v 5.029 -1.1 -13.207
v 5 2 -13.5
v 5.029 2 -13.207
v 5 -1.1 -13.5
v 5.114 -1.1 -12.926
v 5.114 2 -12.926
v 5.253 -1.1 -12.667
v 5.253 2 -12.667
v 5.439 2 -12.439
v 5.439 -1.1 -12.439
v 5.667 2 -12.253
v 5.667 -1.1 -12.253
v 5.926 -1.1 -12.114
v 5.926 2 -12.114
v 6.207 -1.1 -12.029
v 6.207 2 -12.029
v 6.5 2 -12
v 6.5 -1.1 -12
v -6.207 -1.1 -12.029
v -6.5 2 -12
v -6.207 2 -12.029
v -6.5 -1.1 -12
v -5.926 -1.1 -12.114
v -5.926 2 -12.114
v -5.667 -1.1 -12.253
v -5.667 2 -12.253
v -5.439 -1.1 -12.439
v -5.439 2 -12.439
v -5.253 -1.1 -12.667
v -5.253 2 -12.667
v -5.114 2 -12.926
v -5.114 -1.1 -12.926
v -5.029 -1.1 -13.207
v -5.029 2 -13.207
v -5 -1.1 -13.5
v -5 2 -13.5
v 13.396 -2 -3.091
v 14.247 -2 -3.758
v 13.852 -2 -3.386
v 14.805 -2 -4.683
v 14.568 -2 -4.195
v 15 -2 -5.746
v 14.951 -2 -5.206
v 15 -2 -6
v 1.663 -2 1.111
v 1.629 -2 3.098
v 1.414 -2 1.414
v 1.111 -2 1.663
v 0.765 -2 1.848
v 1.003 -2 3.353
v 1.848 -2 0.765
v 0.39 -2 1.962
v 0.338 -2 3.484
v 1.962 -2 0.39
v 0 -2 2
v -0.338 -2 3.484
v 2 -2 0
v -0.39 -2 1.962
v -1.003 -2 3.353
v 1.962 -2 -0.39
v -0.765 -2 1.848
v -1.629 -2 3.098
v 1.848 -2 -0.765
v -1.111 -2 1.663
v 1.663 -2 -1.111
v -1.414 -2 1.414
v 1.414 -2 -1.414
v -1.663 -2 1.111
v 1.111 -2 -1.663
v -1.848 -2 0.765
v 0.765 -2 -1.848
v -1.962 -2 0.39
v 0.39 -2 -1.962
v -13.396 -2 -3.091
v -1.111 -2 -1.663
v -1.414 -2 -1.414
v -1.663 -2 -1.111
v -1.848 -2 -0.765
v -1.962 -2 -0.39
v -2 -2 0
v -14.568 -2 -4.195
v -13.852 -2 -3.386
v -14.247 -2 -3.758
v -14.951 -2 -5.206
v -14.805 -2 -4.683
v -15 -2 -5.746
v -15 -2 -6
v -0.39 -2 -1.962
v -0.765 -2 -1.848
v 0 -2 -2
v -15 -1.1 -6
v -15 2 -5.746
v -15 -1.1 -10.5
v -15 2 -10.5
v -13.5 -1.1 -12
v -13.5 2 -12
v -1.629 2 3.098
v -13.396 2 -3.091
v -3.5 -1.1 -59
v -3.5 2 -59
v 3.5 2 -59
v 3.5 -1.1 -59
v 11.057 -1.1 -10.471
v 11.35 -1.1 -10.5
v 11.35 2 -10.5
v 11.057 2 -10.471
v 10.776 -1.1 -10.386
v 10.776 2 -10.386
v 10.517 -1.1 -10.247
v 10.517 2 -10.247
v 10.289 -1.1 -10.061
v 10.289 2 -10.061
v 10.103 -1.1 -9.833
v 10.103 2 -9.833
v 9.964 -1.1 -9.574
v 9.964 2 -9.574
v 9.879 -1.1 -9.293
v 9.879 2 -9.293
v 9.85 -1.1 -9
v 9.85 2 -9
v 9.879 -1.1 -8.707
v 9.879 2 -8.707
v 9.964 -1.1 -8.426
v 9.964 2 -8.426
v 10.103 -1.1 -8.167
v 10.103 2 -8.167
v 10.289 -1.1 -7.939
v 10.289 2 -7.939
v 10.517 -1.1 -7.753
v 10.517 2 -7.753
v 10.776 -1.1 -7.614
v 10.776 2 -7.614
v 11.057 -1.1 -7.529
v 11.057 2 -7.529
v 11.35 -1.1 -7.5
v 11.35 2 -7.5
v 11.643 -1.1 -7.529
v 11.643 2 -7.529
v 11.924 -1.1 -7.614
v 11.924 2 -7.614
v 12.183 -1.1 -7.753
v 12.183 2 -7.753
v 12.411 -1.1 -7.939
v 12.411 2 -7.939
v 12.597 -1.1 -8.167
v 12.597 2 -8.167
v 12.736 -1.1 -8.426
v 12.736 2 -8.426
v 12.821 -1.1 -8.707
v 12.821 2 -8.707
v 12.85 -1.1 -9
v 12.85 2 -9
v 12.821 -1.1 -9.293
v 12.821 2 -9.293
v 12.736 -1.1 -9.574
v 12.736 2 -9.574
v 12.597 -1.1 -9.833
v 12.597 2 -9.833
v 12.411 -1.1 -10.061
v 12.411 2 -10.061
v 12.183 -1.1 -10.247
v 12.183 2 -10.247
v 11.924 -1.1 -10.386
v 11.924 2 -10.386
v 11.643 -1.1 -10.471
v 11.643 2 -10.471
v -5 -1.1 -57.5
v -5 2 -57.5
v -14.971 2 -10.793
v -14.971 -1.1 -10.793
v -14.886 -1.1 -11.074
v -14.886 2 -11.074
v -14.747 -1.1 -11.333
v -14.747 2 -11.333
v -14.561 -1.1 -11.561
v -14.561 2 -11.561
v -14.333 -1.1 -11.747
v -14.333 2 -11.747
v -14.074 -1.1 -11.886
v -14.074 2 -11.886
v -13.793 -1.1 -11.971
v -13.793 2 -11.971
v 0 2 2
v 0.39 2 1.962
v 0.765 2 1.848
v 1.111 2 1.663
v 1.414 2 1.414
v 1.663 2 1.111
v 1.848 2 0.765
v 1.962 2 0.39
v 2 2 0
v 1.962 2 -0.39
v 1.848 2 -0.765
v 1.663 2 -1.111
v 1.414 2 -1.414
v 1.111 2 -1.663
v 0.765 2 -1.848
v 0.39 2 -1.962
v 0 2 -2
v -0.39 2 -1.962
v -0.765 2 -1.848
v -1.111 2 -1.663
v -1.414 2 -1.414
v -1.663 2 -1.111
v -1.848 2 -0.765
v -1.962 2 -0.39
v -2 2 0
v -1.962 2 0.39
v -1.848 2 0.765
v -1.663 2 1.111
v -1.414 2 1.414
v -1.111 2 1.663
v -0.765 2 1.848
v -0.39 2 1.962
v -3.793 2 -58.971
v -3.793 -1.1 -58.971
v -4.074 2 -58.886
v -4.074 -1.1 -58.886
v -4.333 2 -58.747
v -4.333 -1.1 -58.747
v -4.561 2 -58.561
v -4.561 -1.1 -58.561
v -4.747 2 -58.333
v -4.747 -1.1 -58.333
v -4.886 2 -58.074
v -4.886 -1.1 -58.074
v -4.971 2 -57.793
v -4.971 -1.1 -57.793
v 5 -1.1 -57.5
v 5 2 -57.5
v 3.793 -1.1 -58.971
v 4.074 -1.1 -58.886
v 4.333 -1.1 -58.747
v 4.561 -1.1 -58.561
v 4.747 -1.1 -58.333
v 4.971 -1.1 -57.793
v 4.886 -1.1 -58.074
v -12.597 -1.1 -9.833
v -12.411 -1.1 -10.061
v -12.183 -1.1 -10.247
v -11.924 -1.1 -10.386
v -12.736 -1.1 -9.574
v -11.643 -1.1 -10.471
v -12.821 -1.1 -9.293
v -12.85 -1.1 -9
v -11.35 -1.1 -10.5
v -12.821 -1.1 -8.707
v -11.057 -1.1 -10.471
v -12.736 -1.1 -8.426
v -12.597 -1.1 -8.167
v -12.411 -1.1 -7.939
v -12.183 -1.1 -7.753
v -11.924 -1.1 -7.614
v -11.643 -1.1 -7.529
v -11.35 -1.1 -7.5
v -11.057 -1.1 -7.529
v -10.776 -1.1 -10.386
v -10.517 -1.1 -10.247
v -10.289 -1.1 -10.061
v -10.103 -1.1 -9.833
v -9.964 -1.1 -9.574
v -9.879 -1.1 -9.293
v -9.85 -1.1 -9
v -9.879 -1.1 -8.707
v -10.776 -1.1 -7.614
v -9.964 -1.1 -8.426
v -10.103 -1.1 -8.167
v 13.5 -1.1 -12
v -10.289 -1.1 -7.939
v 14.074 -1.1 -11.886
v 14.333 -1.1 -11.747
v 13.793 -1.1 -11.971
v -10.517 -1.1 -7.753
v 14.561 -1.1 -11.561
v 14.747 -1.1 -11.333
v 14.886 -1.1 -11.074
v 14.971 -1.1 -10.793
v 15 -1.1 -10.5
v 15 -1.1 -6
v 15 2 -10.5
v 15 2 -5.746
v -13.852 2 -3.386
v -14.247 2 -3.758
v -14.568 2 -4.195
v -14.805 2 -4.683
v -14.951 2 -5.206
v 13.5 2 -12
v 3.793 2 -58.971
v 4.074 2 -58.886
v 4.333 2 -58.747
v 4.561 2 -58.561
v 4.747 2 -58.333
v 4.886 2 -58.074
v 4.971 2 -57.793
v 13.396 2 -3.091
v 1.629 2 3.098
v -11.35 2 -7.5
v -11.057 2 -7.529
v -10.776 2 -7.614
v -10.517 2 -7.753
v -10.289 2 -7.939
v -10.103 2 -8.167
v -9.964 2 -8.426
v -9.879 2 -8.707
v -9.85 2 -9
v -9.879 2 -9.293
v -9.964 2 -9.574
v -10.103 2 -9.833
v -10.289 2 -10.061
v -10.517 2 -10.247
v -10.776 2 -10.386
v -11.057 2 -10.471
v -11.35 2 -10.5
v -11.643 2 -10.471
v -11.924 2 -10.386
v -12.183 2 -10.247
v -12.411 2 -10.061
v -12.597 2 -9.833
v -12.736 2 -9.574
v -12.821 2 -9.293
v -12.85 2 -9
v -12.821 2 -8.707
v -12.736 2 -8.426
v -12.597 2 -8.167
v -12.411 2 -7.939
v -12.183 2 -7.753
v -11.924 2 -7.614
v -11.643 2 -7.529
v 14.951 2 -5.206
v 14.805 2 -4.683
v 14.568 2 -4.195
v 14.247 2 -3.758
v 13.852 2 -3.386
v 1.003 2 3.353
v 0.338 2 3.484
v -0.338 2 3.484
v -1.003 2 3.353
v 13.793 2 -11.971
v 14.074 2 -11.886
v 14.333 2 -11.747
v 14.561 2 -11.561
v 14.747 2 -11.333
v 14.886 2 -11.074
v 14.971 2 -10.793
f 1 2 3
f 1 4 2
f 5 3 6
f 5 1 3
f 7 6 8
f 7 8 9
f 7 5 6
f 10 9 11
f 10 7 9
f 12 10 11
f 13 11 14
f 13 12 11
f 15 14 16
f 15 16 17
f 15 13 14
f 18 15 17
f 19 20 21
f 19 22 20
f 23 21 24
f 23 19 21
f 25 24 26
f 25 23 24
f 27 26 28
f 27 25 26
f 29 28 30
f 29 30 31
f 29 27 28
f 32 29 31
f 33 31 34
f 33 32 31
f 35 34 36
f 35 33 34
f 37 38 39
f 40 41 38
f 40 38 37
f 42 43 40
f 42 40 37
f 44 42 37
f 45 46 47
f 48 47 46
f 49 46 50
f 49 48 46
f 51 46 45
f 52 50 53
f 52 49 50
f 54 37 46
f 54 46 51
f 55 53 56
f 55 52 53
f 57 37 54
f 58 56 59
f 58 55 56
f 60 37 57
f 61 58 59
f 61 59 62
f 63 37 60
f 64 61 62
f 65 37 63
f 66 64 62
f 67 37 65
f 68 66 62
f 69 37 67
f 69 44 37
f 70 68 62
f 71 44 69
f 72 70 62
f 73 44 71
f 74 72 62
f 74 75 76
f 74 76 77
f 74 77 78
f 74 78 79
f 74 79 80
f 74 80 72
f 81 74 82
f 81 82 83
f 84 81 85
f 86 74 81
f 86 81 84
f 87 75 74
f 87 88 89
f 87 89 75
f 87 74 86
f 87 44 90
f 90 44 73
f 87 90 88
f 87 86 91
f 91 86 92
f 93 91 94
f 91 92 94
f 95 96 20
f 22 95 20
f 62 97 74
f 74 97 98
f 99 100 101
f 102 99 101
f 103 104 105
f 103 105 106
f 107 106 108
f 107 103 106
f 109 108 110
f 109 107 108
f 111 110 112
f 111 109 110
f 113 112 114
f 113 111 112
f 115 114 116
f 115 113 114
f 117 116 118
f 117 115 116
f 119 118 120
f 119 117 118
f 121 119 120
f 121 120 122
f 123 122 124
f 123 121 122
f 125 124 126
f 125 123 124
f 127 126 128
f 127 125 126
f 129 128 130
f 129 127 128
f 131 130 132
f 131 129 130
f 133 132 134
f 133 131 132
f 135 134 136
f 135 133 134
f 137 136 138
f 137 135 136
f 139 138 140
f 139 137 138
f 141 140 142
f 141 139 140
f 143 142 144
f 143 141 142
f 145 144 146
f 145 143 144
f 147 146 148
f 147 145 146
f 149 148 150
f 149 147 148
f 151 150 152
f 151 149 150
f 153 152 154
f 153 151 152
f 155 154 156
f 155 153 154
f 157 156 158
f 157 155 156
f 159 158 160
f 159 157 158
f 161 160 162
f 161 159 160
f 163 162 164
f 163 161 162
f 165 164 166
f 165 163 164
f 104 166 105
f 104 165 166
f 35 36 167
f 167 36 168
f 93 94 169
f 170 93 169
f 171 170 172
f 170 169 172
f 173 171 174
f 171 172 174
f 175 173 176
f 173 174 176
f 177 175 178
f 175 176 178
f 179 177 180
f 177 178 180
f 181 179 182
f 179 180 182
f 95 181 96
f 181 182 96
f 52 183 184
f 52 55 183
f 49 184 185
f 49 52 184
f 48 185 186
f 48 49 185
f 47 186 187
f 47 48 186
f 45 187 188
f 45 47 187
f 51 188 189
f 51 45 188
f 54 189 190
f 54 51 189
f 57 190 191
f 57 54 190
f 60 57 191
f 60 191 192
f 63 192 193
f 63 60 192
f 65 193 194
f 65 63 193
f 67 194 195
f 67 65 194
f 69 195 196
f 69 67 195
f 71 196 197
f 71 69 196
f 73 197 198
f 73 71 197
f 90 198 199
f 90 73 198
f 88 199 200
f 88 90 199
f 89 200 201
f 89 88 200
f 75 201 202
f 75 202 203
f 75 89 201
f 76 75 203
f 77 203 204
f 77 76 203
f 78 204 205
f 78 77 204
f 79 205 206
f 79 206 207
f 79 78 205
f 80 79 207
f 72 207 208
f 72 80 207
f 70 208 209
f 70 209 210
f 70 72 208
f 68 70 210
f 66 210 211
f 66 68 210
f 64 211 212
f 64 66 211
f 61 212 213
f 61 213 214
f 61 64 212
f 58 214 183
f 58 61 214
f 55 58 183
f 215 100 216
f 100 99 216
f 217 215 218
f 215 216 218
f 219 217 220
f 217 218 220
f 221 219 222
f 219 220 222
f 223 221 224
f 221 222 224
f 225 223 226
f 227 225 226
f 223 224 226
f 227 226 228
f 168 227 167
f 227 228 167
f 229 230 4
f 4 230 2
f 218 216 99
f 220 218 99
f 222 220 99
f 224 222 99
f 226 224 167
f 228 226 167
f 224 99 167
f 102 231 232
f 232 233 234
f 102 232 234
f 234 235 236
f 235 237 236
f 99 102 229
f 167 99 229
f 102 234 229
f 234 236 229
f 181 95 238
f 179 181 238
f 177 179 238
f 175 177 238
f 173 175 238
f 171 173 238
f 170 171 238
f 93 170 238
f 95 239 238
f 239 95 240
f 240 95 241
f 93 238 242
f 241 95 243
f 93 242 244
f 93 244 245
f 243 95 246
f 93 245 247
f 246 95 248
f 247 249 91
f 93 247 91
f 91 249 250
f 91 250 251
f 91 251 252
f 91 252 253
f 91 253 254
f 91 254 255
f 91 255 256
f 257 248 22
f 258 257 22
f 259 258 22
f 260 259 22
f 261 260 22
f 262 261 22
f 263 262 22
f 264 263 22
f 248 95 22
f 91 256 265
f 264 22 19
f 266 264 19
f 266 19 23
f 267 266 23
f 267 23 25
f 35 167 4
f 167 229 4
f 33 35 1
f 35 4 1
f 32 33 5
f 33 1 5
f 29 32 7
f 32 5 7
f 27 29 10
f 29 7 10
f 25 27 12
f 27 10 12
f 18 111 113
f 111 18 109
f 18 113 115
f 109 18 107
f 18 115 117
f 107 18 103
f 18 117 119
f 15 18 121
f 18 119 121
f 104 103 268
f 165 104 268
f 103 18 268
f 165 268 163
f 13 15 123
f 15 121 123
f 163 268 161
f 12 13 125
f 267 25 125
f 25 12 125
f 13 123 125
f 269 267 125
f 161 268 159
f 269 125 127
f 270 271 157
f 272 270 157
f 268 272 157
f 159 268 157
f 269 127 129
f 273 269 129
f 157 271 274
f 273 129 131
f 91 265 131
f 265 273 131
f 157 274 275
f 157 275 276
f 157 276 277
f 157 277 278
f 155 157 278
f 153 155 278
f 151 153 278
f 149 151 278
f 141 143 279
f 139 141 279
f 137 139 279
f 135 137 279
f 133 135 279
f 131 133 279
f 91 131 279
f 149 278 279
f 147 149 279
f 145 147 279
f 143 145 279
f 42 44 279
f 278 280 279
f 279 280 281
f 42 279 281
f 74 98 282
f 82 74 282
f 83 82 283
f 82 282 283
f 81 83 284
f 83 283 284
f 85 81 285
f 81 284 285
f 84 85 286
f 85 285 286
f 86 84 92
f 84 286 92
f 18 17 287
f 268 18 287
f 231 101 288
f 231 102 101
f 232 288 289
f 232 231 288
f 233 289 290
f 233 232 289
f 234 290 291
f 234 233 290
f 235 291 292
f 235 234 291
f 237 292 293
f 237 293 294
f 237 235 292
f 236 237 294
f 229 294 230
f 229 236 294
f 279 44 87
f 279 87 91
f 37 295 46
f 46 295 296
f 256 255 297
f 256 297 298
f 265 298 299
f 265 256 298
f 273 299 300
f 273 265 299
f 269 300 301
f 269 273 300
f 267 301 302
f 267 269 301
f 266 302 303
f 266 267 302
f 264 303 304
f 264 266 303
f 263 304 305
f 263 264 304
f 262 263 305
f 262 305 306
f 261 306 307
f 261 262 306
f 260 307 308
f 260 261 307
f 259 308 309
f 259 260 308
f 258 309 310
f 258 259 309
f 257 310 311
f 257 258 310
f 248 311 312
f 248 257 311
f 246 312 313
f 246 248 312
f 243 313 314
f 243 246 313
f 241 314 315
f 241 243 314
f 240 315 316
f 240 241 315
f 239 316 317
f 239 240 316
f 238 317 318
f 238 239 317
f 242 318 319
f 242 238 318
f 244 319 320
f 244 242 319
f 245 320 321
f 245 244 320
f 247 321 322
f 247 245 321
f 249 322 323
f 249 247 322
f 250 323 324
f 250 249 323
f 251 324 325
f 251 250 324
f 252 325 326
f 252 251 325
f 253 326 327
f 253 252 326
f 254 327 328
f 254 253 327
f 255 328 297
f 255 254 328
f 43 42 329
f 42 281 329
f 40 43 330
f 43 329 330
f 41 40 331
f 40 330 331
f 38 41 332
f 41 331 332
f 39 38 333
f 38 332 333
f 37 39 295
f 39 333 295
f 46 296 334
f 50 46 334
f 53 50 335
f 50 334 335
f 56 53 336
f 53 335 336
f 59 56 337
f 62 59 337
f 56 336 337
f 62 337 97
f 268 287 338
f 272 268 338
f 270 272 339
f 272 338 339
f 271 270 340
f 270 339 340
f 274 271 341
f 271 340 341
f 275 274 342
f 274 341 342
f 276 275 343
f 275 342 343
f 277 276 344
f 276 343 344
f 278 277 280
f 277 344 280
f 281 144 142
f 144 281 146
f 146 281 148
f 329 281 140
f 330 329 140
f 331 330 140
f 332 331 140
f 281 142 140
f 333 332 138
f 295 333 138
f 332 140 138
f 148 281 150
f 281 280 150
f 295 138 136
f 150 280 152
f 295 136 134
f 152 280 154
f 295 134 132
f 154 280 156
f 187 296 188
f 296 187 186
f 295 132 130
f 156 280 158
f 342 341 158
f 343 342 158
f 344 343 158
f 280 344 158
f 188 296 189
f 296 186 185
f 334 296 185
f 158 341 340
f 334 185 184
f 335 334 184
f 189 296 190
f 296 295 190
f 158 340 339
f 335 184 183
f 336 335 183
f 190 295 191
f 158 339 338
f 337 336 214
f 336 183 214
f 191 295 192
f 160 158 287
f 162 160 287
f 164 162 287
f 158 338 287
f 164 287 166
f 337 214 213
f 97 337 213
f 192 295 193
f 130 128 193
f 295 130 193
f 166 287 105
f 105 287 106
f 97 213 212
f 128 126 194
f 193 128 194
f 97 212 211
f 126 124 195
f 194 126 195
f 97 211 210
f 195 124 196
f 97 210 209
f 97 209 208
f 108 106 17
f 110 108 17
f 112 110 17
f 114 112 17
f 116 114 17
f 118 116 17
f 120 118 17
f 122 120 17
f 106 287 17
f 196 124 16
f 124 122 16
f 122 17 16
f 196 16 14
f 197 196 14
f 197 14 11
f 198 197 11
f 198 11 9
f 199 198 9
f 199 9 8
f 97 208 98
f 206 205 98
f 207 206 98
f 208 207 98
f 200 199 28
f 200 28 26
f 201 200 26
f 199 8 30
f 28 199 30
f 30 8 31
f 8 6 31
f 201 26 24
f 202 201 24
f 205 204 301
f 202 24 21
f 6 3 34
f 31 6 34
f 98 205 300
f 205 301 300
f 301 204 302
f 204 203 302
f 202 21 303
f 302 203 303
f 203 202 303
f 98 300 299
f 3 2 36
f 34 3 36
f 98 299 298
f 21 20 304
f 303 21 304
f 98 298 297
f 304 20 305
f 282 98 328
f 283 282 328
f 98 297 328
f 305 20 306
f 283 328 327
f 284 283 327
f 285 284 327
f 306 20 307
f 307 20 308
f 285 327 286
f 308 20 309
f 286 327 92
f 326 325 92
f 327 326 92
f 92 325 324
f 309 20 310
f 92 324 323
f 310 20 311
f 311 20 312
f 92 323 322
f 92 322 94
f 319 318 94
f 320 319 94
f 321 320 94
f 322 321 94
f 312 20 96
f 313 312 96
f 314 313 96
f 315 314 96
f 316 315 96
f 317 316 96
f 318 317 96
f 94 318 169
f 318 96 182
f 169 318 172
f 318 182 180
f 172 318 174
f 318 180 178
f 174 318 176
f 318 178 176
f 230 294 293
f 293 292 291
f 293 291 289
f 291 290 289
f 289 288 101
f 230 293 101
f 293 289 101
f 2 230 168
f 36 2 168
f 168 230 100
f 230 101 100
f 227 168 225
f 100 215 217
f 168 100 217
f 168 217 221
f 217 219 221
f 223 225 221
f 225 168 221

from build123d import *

# Parameters (mm, degrees)
ESBO_O1_R                         = 2
ESBO_O1_R_2                       = 1.5
RESSALTO_EXTRUS_O1_DEPTH          = 2
CORTE_EXTRUS_O4_REACH             = 64.33
ESBO_O4_W                         = 53
ESBO_O4_H                         = 0.9
CORTE_EXTRUS_O4_DIRECTION_2_REACH = 64.33
FILETE2_R                         = 1.5


with BuildPart() as part:
    # Esboço1 → Ressalto-extrusão1 (new, symmetric)
    with BuildSketch(Plane(origin=(0, 0, 0), x_dir=(1, 0, 0), z_dir=(0, 1, 0))):
        with BuildLine():
            Line((-13.5, 12), (-5, 12))
            Line((-5, 12), (-5, 59))
            Line((-5, 59), (5, 59))
            Line((5, 59), (5, 12))
            Line((5, 12), (13.5, 12))
            ThreePointArc((13.5, 12), (14.560660172, 11.560660172), (15, 10.5))
            Line((15, 10.5), (15, 5.746125079))
            ThreePointArc((15, 5.746125079), (14.568000959, 4.195199202), (13.396419283, 3.090938987))
            Line((13.396419283, 3.090938987), (1.62915583, -3.097717108))
            ThreePointArc((1.62915583, -3.097717108), (0, -3.5), (-1.62915583, -3.097717108))
            Line((-1.62915583, -3.097717108), (-13.396419283, 3.090938987))
            ThreePointArc((-13.396419283, 3.090938987), (-14.568000959, 4.195199202), (-15, 5.746125079))
            Line((-15, 5.746125079), (-15, 10.5))
            ThreePointArc((-15, 10.5), (-14.560660172, 11.560660172), (-13.5, 12))
        make_face()
        with Locations(Location((0, 0, 0), (0, 0, 270))):
            Circle(ESBO_O1_R, mode=Mode.SUBTRACT)
        with Locations(Location((-11.35, 9, 0), (0, 0, 270))):
            Circle(ESBO_O1_R_2, mode=Mode.SUBTRACT)
        with Locations(Location((11.35, 9, 0), (0, 0, 90))):
            Circle(ESBO_O1_R_2, mode=Mode.SUBTRACT)
    extrude(amount=RESSALTO_EXTRUS_O1_DEPTH, both=True)

    # Esboço4 → Corte-extrusão4 (cut, up to next)
    with BuildSketch(Plane.ZY.offset(5), mode=Mode.PRIVATE) as corte_extrus_o4_sk1:
        with Locations((-32.5, -1.55)):
            Rectangle(ESBO_O4_W, ESBO_O4_H)
    corte_extrus_o4_tool1 = extrude(corte_extrus_o4_sk1.sketch, amount=CORTE_EXTRUS_O4_REACH, mode=Mode.PRIVATE) & part.part
    add(corte_extrus_o4_tool1.solids().sort_by_distance((-5, -1.55, -32.5))[0], mode=Mode.SUBTRACT)

    # Esboço4 → Corte-extrusão4 direction 2 (cut, up to next)
    with BuildSketch(Plane.ZY.offset(5), mode=Mode.PRIVATE) as corte_extrus_o4_direction_2_sk1:
        with Locations((-32.5, -1.55)):
            Rectangle(ESBO_O4_W, ESBO_O4_H)
    corte_extrus_o4_direction_2_tool1 = extrude(corte_extrus_o4_direction_2_sk1.sketch, amount=-CORTE_EXTRUS_O4_DIRECTION_2_REACH, mode=Mode.PRIVATE) & part.part
    add(corte_extrus_o4_direction_2_tool1.solids().sort_by_distance((-5, -1.55, -32.5))[0], mode=Mode.SUBTRACT)

    # Filete2
    filete2_edges = [part.edges().sort_by_distance(p)[0] for p in [
        (-5, 0.45, -12),
        (-5, 0.45, -59),
        (5, 0.45, -59),
        (5, 0.45, -12),
    ]]
    fillet(filete2_edges, radius=FILETE2_R)


solid = part.part
